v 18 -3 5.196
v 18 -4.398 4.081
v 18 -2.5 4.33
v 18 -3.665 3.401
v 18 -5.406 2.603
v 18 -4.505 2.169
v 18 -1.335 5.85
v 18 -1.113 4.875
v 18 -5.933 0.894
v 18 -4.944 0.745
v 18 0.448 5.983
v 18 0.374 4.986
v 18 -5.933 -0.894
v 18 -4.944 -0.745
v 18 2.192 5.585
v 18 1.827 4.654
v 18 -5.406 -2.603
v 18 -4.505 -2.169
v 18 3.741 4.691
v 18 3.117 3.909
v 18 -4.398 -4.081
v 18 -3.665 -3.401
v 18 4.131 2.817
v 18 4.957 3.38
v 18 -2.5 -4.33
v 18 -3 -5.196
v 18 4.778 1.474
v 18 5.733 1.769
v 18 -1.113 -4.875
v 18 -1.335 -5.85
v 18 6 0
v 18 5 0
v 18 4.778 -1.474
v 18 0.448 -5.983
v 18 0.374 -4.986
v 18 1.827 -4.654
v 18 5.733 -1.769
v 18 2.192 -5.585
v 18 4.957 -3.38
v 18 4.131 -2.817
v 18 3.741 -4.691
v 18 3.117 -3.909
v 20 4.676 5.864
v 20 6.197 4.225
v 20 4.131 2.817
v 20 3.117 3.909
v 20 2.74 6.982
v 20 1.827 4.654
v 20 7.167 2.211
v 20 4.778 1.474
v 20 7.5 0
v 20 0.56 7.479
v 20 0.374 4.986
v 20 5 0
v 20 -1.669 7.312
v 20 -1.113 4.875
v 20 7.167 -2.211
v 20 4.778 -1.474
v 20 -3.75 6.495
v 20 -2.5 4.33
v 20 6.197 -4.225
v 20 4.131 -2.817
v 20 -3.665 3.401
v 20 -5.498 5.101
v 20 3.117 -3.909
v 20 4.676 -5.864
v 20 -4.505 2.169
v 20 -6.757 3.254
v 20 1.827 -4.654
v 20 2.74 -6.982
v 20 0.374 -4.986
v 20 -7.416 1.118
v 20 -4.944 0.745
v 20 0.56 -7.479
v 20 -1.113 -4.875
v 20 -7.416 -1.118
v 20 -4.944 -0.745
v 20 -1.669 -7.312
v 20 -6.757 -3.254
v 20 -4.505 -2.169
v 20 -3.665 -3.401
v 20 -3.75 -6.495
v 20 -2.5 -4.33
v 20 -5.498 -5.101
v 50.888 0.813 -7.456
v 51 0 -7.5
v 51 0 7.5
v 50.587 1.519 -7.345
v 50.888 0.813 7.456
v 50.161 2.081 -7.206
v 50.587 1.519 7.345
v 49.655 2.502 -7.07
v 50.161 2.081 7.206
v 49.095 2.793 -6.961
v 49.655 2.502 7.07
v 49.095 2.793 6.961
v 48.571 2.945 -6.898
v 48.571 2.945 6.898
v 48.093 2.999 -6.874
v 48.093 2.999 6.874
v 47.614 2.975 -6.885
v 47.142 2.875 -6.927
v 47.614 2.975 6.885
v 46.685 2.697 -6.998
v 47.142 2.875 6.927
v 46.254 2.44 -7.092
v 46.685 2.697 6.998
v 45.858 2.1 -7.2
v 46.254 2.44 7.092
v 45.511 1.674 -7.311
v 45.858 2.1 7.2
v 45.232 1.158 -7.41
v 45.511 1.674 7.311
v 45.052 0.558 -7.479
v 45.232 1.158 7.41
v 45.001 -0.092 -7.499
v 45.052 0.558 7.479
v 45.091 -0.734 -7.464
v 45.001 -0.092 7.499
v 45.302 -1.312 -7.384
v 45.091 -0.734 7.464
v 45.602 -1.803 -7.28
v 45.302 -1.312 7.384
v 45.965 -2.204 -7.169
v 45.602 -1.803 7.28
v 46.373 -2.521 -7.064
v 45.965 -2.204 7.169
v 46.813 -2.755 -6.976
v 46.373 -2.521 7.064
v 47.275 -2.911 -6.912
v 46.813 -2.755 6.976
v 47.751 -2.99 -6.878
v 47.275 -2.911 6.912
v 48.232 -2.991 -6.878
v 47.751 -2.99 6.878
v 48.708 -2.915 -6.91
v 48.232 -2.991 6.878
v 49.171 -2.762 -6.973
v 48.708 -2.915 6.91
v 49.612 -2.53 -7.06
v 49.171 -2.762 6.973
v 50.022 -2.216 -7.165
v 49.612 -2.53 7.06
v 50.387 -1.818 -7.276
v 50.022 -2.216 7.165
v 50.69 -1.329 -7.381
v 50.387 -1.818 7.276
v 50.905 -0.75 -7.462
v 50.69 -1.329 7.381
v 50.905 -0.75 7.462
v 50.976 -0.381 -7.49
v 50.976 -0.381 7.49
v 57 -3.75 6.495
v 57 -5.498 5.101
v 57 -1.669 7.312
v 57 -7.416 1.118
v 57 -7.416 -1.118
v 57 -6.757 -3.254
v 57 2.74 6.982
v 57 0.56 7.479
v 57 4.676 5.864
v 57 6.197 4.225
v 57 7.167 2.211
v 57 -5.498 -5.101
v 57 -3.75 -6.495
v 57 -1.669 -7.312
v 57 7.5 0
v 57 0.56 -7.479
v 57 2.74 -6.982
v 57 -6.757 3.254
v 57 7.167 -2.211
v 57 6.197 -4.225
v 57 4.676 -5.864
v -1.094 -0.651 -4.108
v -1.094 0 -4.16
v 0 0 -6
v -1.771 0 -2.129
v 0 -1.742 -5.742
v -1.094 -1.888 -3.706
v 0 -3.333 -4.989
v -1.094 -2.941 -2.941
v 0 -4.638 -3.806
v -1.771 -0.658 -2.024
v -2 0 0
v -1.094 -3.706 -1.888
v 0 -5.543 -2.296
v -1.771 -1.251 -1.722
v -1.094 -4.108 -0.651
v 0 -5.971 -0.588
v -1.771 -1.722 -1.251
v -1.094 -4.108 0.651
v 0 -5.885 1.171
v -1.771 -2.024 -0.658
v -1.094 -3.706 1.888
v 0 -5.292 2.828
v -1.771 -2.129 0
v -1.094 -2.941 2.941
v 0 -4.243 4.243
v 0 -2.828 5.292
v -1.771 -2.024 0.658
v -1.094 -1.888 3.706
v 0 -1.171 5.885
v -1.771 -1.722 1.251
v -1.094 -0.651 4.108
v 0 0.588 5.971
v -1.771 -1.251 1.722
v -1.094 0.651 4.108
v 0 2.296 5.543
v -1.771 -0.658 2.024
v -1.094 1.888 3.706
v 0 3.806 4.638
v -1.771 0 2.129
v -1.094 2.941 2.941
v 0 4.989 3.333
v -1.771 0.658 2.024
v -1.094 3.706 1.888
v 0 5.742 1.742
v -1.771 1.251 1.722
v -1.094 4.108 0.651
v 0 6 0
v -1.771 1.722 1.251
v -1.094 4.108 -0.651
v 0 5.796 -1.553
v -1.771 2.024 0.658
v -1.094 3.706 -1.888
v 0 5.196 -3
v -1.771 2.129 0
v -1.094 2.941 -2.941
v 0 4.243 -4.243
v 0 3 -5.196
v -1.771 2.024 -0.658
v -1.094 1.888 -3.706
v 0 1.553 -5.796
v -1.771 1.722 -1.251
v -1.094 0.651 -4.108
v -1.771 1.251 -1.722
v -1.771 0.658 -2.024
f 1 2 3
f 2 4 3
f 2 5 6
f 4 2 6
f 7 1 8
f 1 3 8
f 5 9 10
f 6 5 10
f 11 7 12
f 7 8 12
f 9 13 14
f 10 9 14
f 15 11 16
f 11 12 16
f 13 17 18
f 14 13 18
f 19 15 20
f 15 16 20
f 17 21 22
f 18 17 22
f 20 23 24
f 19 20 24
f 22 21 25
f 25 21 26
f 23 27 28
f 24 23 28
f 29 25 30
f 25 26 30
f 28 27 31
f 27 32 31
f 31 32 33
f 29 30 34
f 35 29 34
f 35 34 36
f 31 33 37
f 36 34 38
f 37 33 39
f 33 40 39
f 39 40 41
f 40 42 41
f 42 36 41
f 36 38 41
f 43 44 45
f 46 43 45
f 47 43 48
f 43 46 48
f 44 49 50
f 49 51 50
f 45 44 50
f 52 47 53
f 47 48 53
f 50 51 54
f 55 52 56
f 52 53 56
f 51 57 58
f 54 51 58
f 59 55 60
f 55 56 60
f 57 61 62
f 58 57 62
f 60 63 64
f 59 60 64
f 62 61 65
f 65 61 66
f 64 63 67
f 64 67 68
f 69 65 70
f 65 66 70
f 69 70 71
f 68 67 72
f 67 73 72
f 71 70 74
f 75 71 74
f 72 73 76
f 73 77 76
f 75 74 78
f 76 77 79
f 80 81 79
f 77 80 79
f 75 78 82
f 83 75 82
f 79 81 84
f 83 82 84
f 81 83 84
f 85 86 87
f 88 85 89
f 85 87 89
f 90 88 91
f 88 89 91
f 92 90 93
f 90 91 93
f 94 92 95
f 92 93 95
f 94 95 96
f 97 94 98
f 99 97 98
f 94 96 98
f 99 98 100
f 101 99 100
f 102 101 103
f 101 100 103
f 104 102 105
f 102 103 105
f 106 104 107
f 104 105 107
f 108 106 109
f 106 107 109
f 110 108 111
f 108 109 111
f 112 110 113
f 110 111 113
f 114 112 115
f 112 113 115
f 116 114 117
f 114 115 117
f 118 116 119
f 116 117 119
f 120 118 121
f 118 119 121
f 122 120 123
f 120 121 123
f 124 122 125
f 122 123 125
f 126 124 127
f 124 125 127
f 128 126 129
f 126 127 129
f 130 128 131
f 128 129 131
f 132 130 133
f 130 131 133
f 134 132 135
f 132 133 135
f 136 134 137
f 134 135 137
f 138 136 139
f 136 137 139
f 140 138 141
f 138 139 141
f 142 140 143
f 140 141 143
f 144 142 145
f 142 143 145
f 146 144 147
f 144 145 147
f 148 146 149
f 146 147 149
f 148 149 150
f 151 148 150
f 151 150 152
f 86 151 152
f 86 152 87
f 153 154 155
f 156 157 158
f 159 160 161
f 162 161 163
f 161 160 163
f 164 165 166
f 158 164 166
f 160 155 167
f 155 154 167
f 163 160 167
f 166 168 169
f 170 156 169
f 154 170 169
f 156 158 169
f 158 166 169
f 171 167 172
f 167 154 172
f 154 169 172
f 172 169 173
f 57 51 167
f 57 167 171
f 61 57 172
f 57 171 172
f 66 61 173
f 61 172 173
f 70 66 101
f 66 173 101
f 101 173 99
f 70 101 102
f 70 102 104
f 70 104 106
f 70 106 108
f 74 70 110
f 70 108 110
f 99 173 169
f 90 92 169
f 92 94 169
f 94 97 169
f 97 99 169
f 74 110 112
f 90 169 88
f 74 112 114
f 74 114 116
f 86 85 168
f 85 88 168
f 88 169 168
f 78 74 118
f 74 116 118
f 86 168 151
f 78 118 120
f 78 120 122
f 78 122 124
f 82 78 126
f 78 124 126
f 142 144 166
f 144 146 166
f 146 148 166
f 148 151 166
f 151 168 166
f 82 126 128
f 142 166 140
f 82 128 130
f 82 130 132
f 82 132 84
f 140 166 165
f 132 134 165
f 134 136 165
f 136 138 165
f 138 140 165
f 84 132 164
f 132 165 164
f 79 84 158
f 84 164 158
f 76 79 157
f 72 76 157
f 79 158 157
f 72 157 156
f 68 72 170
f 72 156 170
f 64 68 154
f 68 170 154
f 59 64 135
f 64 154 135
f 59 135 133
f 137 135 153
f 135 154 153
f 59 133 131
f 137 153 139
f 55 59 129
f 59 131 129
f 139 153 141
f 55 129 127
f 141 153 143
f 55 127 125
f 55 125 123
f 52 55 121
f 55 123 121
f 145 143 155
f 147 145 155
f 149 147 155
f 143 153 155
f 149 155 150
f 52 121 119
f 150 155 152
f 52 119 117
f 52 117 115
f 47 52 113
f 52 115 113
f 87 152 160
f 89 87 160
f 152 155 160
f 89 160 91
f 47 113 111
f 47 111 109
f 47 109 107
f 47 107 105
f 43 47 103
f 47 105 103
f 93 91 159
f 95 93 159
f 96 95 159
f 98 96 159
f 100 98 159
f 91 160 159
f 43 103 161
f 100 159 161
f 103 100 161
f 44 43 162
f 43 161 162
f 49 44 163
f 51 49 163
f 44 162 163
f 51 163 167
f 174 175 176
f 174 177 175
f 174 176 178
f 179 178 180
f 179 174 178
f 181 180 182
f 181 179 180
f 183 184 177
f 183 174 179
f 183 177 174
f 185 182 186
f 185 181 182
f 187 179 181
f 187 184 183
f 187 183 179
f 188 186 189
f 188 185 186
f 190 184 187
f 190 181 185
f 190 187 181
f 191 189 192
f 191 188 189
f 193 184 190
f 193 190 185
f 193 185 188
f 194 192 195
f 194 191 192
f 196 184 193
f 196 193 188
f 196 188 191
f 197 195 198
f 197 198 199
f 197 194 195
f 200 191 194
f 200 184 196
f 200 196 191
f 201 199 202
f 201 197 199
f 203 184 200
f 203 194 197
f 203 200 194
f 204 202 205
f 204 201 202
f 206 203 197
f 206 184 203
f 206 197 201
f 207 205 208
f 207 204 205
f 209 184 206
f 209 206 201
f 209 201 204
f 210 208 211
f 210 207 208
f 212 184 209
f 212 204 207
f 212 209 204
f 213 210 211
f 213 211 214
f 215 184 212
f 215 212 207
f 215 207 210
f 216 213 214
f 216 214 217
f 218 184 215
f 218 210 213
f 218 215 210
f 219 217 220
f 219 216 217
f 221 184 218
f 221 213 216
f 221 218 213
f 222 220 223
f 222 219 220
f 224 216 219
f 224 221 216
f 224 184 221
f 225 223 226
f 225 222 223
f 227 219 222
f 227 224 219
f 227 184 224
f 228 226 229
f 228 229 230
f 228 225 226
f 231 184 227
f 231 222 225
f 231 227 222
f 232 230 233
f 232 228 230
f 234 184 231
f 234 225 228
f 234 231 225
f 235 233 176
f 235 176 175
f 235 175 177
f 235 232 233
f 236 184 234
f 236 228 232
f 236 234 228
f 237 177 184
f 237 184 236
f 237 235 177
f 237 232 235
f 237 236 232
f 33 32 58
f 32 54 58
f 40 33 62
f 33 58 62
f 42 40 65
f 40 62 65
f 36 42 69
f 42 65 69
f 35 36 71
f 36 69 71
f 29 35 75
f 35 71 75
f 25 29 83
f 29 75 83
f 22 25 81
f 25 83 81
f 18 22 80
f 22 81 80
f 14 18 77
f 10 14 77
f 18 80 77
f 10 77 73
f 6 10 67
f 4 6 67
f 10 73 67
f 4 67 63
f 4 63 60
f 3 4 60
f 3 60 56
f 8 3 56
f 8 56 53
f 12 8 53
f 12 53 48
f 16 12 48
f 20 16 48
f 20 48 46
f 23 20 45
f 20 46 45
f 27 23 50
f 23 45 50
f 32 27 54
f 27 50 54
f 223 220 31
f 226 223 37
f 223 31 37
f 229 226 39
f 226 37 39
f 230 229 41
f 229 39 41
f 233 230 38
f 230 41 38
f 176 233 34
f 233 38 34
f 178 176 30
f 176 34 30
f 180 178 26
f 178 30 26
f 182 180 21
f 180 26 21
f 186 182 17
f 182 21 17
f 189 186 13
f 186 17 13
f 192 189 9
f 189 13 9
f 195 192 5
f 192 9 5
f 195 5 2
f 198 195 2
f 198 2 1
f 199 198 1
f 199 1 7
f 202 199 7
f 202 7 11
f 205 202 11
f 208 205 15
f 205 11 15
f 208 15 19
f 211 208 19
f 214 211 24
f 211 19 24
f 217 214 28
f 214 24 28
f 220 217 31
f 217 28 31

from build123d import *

# Parameters (mm, degrees)
SKETCH2_R               = 3
CUT_EXTRUDE1_DEPTH      = 8.5
CUT_EXTRUDE1_DEPTH_BACK = 8.5
DOME1_FACE_RADIUS       = 6
DOME1_HEIGHT            = 2


with BuildPart() as part:
    # Sketch1 → Revolve1 (revolve)
    with BuildSketch(Plane.XY):
        Polygon((57, 0), (0, 0), (0, 6), (18, 6), (18, 5), (20, 5), (20, 7.5), (57, 7.5), align=None)
    revolve(axis=Axis((57, 0, 0), (-1, 0, 0)))

    # Sketch2 → Cut-Extrude1 (cut, two sides)
    with BuildSketch(Plane.XY) as cut_extrude1_sk:
        with Locations((48, 0)):
            Circle(SKETCH2_R)
    extrude(amount=CUT_EXTRUDE1_DEPTH, mode=Mode.SUBTRACT)
    extrude(cut_extrude1_sk.sketch, amount=-CUT_EXTRUDE1_DEPTH_BACK, mode=Mode.SUBTRACT)

    # Dome1: a dome of height H over a round flat face of radius A is a cap of a sphere of radius (A * A + H * H) / (2 * H)
    dome1_r = (DOME1_FACE_RADIUS * DOME1_FACE_RADIUS + DOME1_HEIGHT * DOME1_HEIGHT) / (2 * DOME1_HEIGHT)
    dome1_base = Plane((0, 0, 0), z_dir=(-1, 0, 0))
    with Locations(dome1_base.offset(DOME1_HEIGHT - dome1_r)):
        dome1_ball = Sphere(dome1_r, mode=Mode.PRIVATE)
    add(split(dome1_ball, bisect_by=dome1_base, keep=Keep.TOP, mode=Mode.PRIVATE))


solid = part.part
